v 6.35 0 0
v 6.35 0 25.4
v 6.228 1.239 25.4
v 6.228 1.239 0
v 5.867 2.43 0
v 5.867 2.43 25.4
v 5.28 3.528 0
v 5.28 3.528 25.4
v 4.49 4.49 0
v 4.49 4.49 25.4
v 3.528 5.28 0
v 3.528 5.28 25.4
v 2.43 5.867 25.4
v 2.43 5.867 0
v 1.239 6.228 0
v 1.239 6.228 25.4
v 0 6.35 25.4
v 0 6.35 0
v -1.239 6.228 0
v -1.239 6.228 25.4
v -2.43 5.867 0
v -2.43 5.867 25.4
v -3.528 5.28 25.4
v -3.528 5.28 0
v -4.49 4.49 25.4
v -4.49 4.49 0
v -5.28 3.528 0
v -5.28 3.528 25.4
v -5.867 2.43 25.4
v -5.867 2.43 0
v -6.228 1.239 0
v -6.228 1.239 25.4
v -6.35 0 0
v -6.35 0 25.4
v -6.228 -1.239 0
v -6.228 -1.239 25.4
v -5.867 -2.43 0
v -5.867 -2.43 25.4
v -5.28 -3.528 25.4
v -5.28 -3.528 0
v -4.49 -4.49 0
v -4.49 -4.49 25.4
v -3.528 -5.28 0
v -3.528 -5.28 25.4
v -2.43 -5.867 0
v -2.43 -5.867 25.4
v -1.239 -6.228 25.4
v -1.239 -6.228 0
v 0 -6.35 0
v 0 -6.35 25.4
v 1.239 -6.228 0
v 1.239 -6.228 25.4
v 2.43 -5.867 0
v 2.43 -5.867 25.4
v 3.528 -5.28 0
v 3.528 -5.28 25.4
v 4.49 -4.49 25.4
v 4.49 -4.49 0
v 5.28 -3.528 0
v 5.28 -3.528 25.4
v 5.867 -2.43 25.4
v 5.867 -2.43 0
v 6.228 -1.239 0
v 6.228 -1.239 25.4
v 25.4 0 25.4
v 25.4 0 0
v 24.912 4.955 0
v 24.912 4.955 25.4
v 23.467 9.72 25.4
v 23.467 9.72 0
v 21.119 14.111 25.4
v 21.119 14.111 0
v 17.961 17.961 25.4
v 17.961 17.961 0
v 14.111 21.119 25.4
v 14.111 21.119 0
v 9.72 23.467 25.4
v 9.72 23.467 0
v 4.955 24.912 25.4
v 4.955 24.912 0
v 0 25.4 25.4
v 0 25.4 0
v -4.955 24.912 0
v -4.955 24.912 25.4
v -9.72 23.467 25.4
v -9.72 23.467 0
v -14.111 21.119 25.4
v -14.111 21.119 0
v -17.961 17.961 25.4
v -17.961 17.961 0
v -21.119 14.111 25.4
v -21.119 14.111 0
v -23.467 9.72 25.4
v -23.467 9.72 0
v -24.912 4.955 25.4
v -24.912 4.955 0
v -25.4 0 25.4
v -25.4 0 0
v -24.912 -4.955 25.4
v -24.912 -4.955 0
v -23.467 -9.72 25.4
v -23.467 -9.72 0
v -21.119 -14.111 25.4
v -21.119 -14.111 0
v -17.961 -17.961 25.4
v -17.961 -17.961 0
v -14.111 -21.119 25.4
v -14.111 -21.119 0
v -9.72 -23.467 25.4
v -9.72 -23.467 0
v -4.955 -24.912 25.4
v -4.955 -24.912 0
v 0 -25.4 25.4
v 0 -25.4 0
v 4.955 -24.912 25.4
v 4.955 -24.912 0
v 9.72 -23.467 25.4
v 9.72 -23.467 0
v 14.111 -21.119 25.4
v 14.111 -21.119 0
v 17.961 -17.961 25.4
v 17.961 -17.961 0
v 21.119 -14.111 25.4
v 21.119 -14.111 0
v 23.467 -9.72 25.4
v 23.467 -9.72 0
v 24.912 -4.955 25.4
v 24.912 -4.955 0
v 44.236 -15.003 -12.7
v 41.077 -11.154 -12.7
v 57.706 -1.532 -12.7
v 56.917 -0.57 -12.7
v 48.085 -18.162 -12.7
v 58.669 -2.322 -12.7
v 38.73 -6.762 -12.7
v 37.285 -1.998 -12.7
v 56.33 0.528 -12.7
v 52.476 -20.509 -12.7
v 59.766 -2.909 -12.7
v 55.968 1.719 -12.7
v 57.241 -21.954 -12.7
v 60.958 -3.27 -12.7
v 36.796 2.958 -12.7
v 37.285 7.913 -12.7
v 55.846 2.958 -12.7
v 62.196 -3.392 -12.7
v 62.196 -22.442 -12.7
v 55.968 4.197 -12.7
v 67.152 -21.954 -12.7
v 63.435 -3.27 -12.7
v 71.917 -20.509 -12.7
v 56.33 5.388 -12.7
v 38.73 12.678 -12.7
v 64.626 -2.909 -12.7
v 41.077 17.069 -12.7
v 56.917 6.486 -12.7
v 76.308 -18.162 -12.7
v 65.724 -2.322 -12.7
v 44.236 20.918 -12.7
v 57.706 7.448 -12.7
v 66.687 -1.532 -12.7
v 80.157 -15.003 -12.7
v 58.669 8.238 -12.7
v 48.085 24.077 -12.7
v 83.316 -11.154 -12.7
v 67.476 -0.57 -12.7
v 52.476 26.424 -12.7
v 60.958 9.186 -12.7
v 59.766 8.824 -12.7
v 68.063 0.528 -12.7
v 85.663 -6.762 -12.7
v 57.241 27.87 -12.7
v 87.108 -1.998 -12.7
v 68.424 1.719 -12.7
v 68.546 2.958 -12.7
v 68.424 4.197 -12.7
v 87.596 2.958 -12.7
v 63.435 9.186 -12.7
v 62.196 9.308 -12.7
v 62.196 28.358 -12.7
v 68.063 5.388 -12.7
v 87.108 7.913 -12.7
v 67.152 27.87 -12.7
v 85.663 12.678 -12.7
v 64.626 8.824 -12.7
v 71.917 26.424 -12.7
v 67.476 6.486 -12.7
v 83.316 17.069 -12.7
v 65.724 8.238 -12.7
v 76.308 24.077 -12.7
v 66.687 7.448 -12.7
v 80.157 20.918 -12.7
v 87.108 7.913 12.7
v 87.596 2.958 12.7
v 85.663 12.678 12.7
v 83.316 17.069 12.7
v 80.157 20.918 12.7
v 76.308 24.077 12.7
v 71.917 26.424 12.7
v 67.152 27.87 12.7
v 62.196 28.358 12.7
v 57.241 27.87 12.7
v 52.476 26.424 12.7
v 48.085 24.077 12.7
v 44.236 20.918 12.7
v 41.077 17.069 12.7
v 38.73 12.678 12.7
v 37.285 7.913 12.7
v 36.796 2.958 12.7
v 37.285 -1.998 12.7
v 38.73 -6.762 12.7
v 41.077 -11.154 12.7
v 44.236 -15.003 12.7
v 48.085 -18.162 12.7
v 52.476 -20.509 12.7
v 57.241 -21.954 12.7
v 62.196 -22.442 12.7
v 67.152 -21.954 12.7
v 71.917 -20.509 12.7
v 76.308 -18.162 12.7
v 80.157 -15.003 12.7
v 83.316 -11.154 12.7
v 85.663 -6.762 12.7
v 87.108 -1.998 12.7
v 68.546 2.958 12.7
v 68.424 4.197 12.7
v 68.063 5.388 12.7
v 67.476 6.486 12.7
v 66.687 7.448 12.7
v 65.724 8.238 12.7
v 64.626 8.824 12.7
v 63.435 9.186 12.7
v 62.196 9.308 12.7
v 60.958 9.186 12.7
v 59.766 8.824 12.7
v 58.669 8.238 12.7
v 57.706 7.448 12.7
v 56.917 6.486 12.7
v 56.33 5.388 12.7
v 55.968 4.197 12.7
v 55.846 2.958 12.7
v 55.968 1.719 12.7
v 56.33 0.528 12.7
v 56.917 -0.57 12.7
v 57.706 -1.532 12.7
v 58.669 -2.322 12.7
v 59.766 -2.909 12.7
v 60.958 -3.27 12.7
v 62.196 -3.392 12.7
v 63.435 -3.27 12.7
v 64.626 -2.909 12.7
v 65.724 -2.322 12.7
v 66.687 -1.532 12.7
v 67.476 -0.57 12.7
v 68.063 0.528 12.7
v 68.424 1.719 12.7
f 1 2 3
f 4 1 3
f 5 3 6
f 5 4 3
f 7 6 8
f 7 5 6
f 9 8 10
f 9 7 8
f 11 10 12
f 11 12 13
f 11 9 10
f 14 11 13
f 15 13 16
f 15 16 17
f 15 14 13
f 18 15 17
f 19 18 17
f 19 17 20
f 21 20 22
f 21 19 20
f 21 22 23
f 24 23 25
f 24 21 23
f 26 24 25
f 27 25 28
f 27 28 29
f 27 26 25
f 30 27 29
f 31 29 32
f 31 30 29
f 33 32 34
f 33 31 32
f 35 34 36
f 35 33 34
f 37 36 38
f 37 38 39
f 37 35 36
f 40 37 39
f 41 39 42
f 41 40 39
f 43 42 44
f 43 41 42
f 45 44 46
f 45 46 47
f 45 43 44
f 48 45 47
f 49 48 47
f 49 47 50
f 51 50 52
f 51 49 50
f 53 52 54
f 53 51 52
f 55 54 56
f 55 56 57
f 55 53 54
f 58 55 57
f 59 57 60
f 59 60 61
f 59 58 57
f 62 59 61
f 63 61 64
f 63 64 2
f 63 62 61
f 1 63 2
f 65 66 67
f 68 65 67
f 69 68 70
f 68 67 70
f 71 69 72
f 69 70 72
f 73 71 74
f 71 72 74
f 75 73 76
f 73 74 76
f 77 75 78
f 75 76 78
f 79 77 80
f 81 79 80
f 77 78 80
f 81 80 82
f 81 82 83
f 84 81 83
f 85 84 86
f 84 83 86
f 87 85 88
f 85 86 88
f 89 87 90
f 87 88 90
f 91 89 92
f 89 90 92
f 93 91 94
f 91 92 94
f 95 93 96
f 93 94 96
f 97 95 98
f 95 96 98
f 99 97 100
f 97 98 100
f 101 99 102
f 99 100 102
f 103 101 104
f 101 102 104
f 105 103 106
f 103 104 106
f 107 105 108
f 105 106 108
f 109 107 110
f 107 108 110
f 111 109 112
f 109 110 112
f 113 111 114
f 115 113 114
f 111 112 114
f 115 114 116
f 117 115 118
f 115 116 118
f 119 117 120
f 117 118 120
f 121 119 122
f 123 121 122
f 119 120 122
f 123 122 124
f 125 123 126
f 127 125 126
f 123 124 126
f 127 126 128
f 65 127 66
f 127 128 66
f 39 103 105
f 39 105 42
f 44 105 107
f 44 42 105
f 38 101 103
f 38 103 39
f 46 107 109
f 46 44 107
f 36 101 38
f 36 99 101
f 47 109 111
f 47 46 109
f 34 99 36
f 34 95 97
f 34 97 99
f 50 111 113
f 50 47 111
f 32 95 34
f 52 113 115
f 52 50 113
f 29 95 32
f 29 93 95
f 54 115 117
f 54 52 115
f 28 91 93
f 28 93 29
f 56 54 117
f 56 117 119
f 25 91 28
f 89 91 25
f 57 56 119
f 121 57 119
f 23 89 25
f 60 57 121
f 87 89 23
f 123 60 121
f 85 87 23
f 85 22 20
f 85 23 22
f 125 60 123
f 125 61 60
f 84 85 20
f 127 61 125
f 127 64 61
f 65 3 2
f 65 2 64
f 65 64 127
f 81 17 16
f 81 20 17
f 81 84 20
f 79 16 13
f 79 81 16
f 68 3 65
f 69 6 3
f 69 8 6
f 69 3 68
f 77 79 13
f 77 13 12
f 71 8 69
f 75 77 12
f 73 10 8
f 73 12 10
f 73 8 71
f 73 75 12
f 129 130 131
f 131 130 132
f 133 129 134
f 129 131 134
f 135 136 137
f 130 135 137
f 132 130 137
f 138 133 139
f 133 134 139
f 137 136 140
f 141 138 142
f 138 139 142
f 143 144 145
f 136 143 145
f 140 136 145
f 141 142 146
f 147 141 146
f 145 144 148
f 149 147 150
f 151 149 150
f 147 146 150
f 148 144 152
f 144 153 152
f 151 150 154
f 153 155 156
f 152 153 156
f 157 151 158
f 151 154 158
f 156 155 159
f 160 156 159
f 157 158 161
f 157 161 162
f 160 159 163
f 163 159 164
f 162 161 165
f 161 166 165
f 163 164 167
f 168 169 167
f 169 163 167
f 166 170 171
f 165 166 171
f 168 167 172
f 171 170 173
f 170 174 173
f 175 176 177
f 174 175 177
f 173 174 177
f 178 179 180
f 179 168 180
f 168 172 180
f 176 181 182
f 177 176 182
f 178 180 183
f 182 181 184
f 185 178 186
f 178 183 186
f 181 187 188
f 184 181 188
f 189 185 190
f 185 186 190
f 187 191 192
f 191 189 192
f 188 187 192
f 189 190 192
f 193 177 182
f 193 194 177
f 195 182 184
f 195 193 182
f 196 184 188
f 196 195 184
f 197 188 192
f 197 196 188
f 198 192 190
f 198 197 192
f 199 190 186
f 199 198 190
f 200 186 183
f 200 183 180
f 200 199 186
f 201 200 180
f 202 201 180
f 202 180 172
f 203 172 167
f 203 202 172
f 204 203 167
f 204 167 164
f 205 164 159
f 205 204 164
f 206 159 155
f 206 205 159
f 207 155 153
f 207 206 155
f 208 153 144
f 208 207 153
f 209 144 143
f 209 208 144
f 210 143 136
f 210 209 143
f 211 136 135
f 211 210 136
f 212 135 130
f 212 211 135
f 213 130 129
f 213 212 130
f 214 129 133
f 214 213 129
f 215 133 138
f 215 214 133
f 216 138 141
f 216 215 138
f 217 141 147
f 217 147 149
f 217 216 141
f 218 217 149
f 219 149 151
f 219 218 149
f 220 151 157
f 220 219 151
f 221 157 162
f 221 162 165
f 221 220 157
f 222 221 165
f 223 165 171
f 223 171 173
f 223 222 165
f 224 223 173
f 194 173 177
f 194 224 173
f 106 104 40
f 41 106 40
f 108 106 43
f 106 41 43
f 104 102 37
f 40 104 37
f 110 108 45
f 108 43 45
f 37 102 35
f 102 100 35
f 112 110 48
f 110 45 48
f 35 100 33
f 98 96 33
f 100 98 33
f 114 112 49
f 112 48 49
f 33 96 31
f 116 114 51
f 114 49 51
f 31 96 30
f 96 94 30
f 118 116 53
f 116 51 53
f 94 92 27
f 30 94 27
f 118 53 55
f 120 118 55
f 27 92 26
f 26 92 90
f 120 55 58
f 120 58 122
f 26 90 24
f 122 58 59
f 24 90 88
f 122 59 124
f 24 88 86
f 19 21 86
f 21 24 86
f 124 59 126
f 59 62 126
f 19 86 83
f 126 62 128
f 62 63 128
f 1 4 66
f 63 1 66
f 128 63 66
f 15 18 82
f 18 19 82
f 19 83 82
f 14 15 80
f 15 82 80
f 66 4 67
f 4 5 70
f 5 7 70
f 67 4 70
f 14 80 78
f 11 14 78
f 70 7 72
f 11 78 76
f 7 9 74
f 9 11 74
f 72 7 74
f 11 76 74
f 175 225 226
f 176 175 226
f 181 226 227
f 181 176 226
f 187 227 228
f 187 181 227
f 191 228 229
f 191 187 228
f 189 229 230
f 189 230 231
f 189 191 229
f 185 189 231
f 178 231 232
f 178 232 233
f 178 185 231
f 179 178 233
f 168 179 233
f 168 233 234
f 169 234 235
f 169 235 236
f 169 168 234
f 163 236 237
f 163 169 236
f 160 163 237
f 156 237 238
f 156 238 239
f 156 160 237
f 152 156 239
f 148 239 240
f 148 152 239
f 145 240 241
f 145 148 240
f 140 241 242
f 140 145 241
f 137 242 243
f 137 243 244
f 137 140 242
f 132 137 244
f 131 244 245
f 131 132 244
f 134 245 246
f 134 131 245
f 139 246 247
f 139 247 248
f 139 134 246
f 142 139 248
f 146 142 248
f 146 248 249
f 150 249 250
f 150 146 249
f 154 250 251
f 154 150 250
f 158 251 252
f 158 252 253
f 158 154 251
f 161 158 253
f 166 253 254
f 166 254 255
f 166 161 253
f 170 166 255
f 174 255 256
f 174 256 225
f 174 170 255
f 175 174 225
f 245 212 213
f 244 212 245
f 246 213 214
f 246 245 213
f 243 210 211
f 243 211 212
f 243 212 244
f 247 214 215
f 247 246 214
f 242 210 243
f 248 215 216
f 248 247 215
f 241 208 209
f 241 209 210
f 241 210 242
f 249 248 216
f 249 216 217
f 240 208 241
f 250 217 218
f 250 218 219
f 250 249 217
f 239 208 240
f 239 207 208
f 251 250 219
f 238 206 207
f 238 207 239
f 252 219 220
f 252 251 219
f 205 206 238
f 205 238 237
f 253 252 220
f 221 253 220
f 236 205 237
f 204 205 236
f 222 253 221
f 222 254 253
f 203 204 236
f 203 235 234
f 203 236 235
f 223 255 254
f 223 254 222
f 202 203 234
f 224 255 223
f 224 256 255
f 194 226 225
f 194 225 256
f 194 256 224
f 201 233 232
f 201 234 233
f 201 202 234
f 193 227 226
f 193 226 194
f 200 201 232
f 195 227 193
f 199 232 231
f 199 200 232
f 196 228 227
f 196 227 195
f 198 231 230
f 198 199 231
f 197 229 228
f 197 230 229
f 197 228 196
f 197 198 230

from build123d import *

# Parameters (mm, degrees)
F0_R     = 25.4
F0_R_2   = 6.35
F1_DEPTH = 25.4
F2_R     = 25.4
F2_R_2   = 6.35
F3_DEPTH = 12.7


with BuildPart() as f1:
    # F0 (on Top) → F1 (new body)
    with BuildSketch(Plane.XY):
        Circle(F0_R)
        Circle(F0_R_2, mode=Mode.SUBTRACT)
    extrude(amount=F1_DEPTH)


with BuildPart() as f3:
    # F2 (on Top) → F3 (new body, symmetric)
    with BuildSketch(Plane.XY):
        with Locations((62.196456, 2.95779)):
            Circle(F2_R)
        with Locations((62.196456, 2.95779)):
            Circle(F2_R_2, mode=Mode.SUBTRACT)
    extrude(amount=F3_DEPTH, both=True)


solid = Compound([f1.part, f3.part])
